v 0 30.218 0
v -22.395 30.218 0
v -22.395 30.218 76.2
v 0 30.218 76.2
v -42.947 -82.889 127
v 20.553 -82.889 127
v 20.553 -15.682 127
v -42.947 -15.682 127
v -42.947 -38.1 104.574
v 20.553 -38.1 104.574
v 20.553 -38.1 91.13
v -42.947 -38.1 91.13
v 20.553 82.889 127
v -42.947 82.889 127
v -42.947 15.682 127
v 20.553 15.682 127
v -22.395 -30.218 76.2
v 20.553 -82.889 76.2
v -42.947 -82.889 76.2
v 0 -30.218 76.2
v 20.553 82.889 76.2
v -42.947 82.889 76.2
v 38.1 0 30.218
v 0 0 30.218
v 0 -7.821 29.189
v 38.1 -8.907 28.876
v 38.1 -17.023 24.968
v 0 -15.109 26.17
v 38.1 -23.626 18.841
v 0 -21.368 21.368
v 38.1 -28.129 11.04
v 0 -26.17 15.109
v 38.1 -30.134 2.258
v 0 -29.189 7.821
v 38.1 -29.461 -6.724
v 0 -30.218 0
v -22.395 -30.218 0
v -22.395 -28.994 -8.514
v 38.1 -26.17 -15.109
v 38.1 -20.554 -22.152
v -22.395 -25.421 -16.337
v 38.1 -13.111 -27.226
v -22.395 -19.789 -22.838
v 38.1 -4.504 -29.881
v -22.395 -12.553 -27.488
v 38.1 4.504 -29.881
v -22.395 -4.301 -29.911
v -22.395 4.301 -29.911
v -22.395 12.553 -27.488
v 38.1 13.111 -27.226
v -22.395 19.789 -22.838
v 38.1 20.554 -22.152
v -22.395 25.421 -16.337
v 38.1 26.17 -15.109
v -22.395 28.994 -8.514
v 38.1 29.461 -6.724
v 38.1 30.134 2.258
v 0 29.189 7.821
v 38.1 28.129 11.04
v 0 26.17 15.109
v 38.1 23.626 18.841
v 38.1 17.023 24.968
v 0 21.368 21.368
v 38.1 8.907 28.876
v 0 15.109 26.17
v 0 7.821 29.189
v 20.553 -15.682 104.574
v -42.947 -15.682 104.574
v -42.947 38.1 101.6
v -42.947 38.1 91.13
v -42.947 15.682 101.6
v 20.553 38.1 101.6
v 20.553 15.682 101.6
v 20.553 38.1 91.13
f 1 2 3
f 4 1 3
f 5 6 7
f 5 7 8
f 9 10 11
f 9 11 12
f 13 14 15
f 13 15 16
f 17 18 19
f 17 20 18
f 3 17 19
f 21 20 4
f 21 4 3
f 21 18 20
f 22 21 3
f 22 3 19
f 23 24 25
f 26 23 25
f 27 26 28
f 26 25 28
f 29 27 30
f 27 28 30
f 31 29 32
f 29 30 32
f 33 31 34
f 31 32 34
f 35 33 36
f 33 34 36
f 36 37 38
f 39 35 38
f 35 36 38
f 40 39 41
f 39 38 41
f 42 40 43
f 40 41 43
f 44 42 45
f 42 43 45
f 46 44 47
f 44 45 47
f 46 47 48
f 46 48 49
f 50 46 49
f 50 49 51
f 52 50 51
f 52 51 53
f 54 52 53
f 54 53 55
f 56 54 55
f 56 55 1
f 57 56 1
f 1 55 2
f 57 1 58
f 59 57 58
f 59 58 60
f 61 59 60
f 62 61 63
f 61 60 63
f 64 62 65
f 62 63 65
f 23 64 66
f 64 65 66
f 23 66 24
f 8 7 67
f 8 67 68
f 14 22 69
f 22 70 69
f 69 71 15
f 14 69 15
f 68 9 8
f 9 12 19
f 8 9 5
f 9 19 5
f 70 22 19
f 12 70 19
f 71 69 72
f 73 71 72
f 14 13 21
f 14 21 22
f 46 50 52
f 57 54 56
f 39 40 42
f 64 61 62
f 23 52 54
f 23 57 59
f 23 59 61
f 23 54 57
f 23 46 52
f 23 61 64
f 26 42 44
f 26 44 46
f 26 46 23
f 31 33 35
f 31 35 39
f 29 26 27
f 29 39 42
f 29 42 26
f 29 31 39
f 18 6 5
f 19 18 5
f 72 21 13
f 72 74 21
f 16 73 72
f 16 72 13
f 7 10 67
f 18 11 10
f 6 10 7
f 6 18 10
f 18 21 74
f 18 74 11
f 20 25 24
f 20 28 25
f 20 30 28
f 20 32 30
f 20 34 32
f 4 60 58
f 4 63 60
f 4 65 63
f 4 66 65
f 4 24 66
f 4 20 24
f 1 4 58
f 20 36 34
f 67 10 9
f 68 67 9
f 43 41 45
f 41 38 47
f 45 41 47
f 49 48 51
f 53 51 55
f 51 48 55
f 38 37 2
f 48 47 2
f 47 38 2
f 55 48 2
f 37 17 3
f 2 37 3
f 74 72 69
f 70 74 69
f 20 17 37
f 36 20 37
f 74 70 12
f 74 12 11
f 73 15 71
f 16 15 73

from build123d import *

# Parameters (mm, degrees)
SKETCH1_R           = 30.21838041
BOSS_EXTRUDE1_DEPTH = 38.1
BOSS_EXTRUDE2_START = 22.394673824
BOSS_EXTRUDE2_DEPTH = 22.394673824
SKETCH4_W           = 63.5
SKETCH4_H           = 76.2
BOSS_EXTRUDE4_DEPTH = 14.929782549
SKETCH5_W           = 63.5
SKETCH5_H           = 50.8
BOSS_EXTRUDE5_DEPTH = 44.789347647
SKETCH7_W           = 63.5
SKETCH7_H           = 25.4
BOSS_EXTRUDE7_DEPTH = 22.41804
SKETCH8_W           = 63.5
SKETCH8_H           = 22.42566
BOSS_EXTRUDE8_DEPTH = 22.41804


with BuildPart() as part:
    # Sketch1 → Boss-Extrude1 (new body)
    with BuildSketch(Plane.YZ):
        with Locations(Location((0, 0, 0), (0, 0, 90))):
            Circle(SKETCH1_R)
    extrude(amount=BOSS_EXTRUDE1_DEPTH)

    # Sketch2 → Boss-Extrude2 (add)
    with BuildSketch(Plane(origin=(0, 0, 0), x_dir=(0, -1, 0), z_dir=(-1, 0, 0)).offset(BOSS_EXTRUDE2_START)):
        with BuildLine():
            Line((-30.21838041, 0), (-30.21838041, 76.2))
            Line((-30.21838041, 76.2), (30.21838041, 76.2))
            Line((30.21838041, 76.2), (30.21838041, 0))
            ThreePointArc((30.21838041, 0), (0, -30.21838041), (-30.21838041, 0))
        make_face()
    extrude(amount=-BOSS_EXTRUDE2_DEPTH)

    # Sketch4 → Boss-Extrude4 (add)
    with BuildSketch(Plane.XY.offset(76.2)):
        with Locations((-11.197336912, 0)):
            Rectangle(SKETCH4_W, SKETCH4_H)
    extrude(amount=BOSS_EXTRUDE4_DEPTH)

    # Sketch5 → Boss-Extrude5 (add)
    with BuildSketch(Plane(origin=(0, 38.1, 0), x_dir=(-1, 0, 0), z_dir=(0, 1, 0))):
        with Locations((11.197336912, 101.6)):
            Rectangle(SKETCH5_W, SKETCH5_H)
    boss_extrude5 = extrude(amount=BOSS_EXTRUDE5_DEPTH)

    # Mirror1: Boss-Extrude5 across plane
    add(boss_extrude5.mirror(Plane.ZX))

    # Sketch7 → Boss-Extrude7 (add)
    with BuildSketch(Plane.XZ.offset(-38.1)):
        with Locations((-11.197336912, 114.3)):
            Rectangle(SKETCH7_W, SKETCH7_H)
    extrude(amount=BOSS_EXTRUDE7_DEPTH)

    # Sketch8 → Boss-Extrude8 (add)
    with BuildSketch(Plane(origin=(0, -38.1, 0), x_dir=(-1, 0, 0), z_dir=(0, 1, 0))):
        with Locations((11.197336912, 115.78717)):
            Rectangle(SKETCH8_W, SKETCH8_H)
    extrude(amount=BOSS_EXTRUDE8_DEPTH)


solid = part.part
